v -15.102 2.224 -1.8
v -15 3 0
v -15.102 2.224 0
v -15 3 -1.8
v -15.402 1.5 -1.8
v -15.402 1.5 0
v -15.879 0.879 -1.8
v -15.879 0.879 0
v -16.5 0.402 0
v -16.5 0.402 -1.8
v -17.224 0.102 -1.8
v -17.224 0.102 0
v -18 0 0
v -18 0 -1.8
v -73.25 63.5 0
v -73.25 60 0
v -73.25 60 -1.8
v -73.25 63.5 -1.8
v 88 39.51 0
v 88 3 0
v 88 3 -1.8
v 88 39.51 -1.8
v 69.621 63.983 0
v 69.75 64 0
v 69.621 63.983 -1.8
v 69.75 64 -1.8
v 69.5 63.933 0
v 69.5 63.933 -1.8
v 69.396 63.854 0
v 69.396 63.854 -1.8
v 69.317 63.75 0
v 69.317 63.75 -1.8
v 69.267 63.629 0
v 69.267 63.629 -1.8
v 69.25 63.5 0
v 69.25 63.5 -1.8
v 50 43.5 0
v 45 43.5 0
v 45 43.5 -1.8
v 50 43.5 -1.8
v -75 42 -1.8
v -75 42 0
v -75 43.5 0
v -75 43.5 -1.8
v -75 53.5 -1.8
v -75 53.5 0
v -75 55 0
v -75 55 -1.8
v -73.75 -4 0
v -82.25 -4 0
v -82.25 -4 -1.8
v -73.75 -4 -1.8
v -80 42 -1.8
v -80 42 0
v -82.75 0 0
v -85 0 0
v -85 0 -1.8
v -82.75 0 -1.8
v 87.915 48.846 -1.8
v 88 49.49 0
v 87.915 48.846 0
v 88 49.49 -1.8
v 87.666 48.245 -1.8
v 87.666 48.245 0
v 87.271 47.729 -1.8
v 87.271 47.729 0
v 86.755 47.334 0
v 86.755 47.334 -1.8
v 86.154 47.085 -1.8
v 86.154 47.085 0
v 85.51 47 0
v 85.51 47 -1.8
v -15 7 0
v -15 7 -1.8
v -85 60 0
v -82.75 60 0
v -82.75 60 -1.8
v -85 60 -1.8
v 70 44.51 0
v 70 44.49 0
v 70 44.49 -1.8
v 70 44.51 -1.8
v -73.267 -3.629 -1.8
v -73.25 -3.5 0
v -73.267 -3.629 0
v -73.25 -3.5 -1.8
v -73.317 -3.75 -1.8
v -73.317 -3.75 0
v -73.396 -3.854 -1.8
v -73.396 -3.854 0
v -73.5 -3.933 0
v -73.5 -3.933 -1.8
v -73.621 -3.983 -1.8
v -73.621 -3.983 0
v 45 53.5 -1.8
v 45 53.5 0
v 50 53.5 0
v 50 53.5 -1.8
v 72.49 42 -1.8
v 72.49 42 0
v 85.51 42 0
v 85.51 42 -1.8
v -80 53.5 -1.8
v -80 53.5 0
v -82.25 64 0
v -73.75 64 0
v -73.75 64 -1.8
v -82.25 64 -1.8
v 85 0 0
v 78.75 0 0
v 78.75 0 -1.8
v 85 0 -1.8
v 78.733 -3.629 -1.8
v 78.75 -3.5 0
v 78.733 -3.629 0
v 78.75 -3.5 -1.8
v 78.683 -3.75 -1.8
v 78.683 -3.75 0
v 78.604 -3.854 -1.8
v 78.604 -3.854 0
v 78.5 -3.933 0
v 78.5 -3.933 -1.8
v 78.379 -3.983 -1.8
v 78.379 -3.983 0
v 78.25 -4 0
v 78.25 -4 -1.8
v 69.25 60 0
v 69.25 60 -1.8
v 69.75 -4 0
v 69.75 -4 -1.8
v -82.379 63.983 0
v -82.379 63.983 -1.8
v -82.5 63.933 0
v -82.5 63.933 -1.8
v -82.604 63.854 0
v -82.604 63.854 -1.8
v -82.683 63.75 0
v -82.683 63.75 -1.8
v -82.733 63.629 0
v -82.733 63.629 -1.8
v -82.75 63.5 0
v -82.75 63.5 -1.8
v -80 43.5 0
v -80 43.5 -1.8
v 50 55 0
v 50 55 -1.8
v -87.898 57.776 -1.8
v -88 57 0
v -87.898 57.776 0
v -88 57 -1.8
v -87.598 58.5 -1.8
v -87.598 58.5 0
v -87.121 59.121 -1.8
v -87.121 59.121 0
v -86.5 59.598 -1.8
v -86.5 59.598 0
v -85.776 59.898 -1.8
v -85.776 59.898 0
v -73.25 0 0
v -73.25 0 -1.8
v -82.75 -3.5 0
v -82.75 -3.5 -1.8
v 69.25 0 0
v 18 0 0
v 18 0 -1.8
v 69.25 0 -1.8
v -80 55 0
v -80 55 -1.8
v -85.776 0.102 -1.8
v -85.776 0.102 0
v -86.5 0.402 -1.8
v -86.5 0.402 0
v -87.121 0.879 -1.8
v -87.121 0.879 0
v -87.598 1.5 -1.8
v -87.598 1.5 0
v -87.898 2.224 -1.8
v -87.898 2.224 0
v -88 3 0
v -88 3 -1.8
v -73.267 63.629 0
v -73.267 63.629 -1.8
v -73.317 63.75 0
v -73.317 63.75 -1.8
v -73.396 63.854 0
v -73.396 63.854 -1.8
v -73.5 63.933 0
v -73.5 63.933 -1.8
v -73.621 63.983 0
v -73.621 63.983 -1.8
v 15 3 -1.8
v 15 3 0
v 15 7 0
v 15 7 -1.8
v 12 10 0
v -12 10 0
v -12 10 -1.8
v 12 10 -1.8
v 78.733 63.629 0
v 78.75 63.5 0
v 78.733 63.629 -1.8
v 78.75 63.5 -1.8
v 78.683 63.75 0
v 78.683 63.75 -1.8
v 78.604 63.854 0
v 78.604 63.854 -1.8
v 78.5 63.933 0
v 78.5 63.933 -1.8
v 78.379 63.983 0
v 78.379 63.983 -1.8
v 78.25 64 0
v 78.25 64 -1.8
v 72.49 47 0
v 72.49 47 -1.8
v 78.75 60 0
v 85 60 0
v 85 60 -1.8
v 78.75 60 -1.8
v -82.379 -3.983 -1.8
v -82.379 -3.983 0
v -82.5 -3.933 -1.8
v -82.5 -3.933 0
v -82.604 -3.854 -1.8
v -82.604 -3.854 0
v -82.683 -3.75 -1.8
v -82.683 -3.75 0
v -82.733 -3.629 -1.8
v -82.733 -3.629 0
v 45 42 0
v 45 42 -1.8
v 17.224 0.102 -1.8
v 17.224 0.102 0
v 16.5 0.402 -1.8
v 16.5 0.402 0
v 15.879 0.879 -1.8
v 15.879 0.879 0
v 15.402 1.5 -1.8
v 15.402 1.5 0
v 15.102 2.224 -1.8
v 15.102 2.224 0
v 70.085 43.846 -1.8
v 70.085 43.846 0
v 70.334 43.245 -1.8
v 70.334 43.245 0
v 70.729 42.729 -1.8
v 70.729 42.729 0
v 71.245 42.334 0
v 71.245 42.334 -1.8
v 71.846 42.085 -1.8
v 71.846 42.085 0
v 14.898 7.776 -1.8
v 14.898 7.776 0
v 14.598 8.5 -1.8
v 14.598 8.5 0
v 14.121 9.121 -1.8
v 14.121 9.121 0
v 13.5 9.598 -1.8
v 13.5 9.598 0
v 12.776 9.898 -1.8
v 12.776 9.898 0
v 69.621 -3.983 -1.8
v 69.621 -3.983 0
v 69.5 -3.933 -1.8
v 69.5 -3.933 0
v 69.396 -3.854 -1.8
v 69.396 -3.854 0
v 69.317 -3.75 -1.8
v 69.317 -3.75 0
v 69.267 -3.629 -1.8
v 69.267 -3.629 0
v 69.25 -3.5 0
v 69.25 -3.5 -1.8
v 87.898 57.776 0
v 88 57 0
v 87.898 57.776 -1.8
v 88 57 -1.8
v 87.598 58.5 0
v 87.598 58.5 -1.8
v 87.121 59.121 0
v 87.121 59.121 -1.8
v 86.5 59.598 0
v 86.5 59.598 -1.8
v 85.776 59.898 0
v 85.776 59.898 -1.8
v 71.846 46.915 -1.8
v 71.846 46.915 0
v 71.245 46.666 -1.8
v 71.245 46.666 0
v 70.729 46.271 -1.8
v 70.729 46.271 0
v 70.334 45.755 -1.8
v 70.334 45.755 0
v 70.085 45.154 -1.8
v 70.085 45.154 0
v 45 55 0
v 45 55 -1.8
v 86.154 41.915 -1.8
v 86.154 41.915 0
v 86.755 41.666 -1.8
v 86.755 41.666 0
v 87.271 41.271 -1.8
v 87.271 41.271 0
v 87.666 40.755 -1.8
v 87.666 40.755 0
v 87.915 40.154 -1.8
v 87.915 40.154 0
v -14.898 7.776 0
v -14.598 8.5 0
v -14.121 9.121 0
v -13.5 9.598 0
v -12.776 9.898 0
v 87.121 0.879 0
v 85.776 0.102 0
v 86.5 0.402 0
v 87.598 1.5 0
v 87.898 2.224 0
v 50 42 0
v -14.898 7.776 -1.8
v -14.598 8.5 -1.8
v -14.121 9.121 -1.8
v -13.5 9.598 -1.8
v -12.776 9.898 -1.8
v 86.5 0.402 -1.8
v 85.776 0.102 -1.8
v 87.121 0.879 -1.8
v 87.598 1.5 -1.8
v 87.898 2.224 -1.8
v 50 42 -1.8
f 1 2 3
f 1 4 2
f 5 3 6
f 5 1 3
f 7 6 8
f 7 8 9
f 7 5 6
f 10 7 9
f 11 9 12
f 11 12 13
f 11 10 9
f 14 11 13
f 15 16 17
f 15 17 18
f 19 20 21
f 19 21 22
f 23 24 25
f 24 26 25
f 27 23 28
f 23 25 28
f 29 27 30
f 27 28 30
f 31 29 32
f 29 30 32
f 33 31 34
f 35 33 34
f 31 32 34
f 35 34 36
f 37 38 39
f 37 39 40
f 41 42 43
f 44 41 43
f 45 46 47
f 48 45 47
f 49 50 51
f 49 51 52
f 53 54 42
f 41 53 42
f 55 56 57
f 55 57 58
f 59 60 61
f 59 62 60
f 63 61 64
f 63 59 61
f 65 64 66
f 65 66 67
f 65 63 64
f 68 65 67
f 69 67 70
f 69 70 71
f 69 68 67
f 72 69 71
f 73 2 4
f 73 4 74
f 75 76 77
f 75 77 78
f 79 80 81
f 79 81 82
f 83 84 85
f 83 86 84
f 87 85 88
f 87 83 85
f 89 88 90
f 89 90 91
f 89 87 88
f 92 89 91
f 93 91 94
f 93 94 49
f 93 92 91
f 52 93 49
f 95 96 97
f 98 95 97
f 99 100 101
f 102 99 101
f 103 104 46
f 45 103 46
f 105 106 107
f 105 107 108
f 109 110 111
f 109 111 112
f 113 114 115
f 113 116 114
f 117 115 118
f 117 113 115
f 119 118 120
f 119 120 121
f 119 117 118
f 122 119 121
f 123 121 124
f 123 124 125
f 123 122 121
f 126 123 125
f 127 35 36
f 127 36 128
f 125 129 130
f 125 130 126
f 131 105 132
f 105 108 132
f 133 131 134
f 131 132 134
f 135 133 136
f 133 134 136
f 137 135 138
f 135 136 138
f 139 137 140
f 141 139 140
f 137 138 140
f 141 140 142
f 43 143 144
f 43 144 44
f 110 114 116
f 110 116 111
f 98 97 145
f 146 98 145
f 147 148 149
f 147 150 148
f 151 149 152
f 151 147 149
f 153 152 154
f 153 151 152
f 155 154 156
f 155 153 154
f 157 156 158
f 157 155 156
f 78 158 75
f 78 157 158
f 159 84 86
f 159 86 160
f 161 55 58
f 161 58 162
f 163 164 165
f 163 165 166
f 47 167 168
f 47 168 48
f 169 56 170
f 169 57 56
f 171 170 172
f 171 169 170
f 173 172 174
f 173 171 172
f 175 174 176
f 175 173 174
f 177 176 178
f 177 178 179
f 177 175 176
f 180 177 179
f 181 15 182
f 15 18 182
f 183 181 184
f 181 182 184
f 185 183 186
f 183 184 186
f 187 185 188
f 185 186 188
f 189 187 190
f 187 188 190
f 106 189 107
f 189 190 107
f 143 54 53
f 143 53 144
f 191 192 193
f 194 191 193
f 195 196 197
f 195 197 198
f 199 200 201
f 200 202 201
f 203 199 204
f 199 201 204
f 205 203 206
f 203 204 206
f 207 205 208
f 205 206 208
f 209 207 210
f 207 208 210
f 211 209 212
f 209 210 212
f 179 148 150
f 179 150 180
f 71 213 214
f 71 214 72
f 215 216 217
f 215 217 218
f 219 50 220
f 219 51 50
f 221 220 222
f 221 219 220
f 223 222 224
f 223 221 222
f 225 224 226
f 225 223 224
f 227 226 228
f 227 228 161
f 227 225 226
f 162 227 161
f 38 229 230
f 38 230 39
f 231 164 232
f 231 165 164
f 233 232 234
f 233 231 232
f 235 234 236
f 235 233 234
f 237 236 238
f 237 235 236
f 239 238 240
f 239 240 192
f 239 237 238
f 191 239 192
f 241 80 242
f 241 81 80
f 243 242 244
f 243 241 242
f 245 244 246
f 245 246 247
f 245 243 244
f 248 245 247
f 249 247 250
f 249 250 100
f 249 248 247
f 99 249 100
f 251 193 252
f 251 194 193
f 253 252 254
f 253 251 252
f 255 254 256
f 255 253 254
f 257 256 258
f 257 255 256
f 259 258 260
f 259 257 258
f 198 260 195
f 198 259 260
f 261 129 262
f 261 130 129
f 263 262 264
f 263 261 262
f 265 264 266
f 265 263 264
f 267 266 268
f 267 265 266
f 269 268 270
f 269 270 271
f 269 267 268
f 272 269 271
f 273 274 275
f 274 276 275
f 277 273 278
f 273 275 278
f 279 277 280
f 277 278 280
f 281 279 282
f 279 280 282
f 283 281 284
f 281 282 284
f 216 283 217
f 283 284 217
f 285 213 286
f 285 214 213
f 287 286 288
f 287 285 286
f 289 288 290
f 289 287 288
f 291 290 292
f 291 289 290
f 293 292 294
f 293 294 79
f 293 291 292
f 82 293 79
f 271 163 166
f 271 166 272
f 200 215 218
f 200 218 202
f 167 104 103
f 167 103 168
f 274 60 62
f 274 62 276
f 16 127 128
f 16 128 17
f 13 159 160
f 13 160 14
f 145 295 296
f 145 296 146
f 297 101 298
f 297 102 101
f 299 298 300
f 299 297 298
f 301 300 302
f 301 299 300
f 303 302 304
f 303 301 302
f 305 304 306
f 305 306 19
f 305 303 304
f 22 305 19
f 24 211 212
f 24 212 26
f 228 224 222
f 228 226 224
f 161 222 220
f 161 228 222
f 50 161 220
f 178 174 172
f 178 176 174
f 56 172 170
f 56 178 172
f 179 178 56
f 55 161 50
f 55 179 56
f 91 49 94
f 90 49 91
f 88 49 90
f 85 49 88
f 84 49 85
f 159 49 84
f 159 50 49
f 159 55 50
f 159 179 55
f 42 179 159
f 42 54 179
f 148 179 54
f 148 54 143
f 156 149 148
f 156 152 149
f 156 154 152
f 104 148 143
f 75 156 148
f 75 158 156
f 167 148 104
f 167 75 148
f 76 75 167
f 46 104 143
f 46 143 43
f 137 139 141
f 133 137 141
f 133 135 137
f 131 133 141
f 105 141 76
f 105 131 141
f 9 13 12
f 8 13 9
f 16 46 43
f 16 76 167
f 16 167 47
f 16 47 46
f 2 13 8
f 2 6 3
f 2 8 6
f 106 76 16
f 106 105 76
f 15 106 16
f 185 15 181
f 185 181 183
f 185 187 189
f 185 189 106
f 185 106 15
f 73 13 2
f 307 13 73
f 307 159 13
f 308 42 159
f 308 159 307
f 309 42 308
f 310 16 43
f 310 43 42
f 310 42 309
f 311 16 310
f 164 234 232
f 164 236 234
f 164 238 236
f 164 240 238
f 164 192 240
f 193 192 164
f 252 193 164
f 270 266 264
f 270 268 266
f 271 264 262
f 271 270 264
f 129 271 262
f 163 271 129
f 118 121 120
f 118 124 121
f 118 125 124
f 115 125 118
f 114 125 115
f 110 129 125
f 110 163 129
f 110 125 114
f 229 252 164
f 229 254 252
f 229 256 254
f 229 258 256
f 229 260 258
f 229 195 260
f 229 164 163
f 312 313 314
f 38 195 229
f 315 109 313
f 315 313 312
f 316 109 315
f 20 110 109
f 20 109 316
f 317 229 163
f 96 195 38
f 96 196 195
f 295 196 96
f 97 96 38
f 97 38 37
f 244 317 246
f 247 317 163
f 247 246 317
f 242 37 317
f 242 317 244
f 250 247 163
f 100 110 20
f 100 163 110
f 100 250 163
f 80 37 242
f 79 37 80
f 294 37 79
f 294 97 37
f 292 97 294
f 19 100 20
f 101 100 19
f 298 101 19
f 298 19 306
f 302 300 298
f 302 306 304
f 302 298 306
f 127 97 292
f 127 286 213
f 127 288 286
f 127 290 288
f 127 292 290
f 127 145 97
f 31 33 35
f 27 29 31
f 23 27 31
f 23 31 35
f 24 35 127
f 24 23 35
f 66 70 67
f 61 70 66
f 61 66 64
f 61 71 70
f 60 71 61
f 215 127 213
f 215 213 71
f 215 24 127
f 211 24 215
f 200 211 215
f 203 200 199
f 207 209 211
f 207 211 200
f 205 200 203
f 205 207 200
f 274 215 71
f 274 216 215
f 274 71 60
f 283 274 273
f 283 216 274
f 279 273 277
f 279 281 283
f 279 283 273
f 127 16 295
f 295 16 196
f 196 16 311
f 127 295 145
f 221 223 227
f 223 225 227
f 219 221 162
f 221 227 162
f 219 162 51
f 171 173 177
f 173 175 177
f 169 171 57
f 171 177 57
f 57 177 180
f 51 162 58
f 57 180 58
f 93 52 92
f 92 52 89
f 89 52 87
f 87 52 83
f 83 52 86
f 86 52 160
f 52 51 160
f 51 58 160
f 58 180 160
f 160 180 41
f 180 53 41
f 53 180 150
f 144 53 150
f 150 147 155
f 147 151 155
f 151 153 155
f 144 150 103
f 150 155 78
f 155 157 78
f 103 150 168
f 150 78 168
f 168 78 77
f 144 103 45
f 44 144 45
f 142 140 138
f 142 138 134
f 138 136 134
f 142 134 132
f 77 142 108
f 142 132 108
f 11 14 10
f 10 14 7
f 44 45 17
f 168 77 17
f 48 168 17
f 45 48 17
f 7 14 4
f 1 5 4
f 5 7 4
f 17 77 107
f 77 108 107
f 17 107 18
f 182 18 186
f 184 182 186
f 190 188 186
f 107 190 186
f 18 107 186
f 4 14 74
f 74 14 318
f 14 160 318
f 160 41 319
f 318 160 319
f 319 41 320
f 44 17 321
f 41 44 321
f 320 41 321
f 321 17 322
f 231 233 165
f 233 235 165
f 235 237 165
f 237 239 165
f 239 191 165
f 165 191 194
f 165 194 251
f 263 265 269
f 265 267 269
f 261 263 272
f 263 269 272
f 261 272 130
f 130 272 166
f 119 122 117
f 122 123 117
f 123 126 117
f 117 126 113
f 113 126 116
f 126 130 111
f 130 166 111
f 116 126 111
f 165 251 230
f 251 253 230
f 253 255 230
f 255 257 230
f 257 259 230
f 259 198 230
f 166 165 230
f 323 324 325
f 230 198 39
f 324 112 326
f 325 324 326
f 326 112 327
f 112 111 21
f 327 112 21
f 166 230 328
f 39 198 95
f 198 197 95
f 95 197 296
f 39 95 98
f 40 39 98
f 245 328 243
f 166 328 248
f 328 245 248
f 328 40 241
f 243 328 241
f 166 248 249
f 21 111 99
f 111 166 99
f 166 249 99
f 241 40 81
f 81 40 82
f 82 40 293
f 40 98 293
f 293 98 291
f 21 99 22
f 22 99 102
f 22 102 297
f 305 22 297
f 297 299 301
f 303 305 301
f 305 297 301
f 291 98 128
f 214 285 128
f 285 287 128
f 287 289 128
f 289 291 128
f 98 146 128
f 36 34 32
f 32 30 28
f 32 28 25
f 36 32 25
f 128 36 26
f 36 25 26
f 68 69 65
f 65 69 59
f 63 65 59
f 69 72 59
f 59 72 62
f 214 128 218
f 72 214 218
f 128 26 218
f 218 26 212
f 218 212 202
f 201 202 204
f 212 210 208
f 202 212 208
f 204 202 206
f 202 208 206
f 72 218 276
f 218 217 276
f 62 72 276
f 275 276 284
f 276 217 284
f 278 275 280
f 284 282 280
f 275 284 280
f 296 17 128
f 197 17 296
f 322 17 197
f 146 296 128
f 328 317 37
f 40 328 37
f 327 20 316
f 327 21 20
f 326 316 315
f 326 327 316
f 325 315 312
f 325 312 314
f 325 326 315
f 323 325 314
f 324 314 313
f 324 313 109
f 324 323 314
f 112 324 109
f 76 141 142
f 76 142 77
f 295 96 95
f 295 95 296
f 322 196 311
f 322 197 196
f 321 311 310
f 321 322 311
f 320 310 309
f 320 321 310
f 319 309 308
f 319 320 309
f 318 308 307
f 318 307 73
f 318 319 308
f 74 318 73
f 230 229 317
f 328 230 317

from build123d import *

# Parameters (mm, degrees)
PAD_DEPTH            = 1.8
SKETCH001_W          = 30
SKETCH001_H          = 10
POCKET_DEPTH         = 1.801
POCKET_DEPTH_BACK    = 0.001
FILLET_R             = 3
FILLET001_R          = 0.5
SKETCH002_W          = 5
SKETCH002_H          = 1.5
SKETCH002_W_2        = 50
SKETCH002_H_2        = 5
POCKET001_DEPTH      = 1.801
POCKET001_DEPTH_BACK = 0.001
FILLET002_R          = 2.49


with BuildPart() as part:
    # Sketch → Pad (new body)
    with BuildSketch(Plane.XY):
        Polygon((88, 0), (88, 60), (78.75, 60), (78.75, 64), (69.25, 64), (69.25, 60), (-73.25, 60), (-73.25, 64), (-82.75, 64), (-82.75, 60), (-88, 60), (-88, 0), (-82.75, 0), (-82.75, -4), (-73.25, -4), (-73.25, 0), (69.25, 0), (69.25, -4), (78.75, -4), (78.75, 0), align=None)
    extrude(amount=-PAD_DEPTH)

    # Sketch001 → Pocket (cut, two sides)
    with BuildSketch(Plane.XY) as pocket_sk:
        with Locations((0, 5)):
            Rectangle(SKETCH001_W, SKETCH001_H)
    extrude(amount=-POCKET_DEPTH, mode=Mode.SUBTRACT)
    extrude(pocket_sk.sketch, amount=POCKET_DEPTH_BACK, mode=Mode.SUBTRACT)

    # Fillet
    fillet_edges = [part.edges().sort_by_distance(p)[0] for p in [
        (88, 0, -0.9),
        (88, 60, -0.9),
        (-88, 60, -0.9),
        (-88, 0, -0.9),
        (15, 0, -0.9),
        (15, 10, -0.9),
        (-15, 10, -0.9),
        (-15, 0, -0.9),
    ]]
    fillet(fillet_edges, radius=FILLET_R)

    # Fillet001
    fillet001_edges = [part.edges().sort_by_distance(p)[0] for p in [
        (-82.75, -4, -0.9),
        (-73.25, -4, -0.9),
        (69.25, -4, -0.9),
        (78.75, -4, -0.9),
        (78.75, 64, -0.9),
        (69.25, 64, -0.9),
        (-73.25, 64, -0.9),
        (-82.75, 64, -0.9),
    ]]
    fillet(fillet001_edges, radius=FILLET001_R)

    # Sketch002 → Pocket001 (cut, two sides)
    with BuildSketch(Plane.XY) as pocket001_sk:
        with Locations((47.5, 54.25)):
            Rectangle(SKETCH002_W, SKETCH002_H)
        with Locations((47.5, 42.75)):
            Rectangle(SKETCH002_W, SKETCH002_H)
        with Locations((-77.5, 54.25)):
            Rectangle(SKETCH002_W, SKETCH002_H)
        with Locations((-77.5, 42.75)):
            Rectangle(SKETCH002_W, SKETCH002_H)
        with Locations((95, 44.5)):
            Rectangle(SKETCH002_W_2, SKETCH002_H_2)
    extrude(amount=-POCKET001_DEPTH, mode=Mode.SUBTRACT)
    extrude(pocket001_sk.sketch, amount=POCKET001_DEPTH_BACK, mode=Mode.SUBTRACT)

    # Fillet002
    fillet002_edges = [part.edges().sort_by_distance(p)[0] for p in [
        (70, 42, -0.9),
        (70, 47, -0.9),
        (88, 47, -0.9),
        (88, 42, -0.9),
    ]]
    fillet(fillet002_edges, radius=FILLET002_R)


solid = part.part
